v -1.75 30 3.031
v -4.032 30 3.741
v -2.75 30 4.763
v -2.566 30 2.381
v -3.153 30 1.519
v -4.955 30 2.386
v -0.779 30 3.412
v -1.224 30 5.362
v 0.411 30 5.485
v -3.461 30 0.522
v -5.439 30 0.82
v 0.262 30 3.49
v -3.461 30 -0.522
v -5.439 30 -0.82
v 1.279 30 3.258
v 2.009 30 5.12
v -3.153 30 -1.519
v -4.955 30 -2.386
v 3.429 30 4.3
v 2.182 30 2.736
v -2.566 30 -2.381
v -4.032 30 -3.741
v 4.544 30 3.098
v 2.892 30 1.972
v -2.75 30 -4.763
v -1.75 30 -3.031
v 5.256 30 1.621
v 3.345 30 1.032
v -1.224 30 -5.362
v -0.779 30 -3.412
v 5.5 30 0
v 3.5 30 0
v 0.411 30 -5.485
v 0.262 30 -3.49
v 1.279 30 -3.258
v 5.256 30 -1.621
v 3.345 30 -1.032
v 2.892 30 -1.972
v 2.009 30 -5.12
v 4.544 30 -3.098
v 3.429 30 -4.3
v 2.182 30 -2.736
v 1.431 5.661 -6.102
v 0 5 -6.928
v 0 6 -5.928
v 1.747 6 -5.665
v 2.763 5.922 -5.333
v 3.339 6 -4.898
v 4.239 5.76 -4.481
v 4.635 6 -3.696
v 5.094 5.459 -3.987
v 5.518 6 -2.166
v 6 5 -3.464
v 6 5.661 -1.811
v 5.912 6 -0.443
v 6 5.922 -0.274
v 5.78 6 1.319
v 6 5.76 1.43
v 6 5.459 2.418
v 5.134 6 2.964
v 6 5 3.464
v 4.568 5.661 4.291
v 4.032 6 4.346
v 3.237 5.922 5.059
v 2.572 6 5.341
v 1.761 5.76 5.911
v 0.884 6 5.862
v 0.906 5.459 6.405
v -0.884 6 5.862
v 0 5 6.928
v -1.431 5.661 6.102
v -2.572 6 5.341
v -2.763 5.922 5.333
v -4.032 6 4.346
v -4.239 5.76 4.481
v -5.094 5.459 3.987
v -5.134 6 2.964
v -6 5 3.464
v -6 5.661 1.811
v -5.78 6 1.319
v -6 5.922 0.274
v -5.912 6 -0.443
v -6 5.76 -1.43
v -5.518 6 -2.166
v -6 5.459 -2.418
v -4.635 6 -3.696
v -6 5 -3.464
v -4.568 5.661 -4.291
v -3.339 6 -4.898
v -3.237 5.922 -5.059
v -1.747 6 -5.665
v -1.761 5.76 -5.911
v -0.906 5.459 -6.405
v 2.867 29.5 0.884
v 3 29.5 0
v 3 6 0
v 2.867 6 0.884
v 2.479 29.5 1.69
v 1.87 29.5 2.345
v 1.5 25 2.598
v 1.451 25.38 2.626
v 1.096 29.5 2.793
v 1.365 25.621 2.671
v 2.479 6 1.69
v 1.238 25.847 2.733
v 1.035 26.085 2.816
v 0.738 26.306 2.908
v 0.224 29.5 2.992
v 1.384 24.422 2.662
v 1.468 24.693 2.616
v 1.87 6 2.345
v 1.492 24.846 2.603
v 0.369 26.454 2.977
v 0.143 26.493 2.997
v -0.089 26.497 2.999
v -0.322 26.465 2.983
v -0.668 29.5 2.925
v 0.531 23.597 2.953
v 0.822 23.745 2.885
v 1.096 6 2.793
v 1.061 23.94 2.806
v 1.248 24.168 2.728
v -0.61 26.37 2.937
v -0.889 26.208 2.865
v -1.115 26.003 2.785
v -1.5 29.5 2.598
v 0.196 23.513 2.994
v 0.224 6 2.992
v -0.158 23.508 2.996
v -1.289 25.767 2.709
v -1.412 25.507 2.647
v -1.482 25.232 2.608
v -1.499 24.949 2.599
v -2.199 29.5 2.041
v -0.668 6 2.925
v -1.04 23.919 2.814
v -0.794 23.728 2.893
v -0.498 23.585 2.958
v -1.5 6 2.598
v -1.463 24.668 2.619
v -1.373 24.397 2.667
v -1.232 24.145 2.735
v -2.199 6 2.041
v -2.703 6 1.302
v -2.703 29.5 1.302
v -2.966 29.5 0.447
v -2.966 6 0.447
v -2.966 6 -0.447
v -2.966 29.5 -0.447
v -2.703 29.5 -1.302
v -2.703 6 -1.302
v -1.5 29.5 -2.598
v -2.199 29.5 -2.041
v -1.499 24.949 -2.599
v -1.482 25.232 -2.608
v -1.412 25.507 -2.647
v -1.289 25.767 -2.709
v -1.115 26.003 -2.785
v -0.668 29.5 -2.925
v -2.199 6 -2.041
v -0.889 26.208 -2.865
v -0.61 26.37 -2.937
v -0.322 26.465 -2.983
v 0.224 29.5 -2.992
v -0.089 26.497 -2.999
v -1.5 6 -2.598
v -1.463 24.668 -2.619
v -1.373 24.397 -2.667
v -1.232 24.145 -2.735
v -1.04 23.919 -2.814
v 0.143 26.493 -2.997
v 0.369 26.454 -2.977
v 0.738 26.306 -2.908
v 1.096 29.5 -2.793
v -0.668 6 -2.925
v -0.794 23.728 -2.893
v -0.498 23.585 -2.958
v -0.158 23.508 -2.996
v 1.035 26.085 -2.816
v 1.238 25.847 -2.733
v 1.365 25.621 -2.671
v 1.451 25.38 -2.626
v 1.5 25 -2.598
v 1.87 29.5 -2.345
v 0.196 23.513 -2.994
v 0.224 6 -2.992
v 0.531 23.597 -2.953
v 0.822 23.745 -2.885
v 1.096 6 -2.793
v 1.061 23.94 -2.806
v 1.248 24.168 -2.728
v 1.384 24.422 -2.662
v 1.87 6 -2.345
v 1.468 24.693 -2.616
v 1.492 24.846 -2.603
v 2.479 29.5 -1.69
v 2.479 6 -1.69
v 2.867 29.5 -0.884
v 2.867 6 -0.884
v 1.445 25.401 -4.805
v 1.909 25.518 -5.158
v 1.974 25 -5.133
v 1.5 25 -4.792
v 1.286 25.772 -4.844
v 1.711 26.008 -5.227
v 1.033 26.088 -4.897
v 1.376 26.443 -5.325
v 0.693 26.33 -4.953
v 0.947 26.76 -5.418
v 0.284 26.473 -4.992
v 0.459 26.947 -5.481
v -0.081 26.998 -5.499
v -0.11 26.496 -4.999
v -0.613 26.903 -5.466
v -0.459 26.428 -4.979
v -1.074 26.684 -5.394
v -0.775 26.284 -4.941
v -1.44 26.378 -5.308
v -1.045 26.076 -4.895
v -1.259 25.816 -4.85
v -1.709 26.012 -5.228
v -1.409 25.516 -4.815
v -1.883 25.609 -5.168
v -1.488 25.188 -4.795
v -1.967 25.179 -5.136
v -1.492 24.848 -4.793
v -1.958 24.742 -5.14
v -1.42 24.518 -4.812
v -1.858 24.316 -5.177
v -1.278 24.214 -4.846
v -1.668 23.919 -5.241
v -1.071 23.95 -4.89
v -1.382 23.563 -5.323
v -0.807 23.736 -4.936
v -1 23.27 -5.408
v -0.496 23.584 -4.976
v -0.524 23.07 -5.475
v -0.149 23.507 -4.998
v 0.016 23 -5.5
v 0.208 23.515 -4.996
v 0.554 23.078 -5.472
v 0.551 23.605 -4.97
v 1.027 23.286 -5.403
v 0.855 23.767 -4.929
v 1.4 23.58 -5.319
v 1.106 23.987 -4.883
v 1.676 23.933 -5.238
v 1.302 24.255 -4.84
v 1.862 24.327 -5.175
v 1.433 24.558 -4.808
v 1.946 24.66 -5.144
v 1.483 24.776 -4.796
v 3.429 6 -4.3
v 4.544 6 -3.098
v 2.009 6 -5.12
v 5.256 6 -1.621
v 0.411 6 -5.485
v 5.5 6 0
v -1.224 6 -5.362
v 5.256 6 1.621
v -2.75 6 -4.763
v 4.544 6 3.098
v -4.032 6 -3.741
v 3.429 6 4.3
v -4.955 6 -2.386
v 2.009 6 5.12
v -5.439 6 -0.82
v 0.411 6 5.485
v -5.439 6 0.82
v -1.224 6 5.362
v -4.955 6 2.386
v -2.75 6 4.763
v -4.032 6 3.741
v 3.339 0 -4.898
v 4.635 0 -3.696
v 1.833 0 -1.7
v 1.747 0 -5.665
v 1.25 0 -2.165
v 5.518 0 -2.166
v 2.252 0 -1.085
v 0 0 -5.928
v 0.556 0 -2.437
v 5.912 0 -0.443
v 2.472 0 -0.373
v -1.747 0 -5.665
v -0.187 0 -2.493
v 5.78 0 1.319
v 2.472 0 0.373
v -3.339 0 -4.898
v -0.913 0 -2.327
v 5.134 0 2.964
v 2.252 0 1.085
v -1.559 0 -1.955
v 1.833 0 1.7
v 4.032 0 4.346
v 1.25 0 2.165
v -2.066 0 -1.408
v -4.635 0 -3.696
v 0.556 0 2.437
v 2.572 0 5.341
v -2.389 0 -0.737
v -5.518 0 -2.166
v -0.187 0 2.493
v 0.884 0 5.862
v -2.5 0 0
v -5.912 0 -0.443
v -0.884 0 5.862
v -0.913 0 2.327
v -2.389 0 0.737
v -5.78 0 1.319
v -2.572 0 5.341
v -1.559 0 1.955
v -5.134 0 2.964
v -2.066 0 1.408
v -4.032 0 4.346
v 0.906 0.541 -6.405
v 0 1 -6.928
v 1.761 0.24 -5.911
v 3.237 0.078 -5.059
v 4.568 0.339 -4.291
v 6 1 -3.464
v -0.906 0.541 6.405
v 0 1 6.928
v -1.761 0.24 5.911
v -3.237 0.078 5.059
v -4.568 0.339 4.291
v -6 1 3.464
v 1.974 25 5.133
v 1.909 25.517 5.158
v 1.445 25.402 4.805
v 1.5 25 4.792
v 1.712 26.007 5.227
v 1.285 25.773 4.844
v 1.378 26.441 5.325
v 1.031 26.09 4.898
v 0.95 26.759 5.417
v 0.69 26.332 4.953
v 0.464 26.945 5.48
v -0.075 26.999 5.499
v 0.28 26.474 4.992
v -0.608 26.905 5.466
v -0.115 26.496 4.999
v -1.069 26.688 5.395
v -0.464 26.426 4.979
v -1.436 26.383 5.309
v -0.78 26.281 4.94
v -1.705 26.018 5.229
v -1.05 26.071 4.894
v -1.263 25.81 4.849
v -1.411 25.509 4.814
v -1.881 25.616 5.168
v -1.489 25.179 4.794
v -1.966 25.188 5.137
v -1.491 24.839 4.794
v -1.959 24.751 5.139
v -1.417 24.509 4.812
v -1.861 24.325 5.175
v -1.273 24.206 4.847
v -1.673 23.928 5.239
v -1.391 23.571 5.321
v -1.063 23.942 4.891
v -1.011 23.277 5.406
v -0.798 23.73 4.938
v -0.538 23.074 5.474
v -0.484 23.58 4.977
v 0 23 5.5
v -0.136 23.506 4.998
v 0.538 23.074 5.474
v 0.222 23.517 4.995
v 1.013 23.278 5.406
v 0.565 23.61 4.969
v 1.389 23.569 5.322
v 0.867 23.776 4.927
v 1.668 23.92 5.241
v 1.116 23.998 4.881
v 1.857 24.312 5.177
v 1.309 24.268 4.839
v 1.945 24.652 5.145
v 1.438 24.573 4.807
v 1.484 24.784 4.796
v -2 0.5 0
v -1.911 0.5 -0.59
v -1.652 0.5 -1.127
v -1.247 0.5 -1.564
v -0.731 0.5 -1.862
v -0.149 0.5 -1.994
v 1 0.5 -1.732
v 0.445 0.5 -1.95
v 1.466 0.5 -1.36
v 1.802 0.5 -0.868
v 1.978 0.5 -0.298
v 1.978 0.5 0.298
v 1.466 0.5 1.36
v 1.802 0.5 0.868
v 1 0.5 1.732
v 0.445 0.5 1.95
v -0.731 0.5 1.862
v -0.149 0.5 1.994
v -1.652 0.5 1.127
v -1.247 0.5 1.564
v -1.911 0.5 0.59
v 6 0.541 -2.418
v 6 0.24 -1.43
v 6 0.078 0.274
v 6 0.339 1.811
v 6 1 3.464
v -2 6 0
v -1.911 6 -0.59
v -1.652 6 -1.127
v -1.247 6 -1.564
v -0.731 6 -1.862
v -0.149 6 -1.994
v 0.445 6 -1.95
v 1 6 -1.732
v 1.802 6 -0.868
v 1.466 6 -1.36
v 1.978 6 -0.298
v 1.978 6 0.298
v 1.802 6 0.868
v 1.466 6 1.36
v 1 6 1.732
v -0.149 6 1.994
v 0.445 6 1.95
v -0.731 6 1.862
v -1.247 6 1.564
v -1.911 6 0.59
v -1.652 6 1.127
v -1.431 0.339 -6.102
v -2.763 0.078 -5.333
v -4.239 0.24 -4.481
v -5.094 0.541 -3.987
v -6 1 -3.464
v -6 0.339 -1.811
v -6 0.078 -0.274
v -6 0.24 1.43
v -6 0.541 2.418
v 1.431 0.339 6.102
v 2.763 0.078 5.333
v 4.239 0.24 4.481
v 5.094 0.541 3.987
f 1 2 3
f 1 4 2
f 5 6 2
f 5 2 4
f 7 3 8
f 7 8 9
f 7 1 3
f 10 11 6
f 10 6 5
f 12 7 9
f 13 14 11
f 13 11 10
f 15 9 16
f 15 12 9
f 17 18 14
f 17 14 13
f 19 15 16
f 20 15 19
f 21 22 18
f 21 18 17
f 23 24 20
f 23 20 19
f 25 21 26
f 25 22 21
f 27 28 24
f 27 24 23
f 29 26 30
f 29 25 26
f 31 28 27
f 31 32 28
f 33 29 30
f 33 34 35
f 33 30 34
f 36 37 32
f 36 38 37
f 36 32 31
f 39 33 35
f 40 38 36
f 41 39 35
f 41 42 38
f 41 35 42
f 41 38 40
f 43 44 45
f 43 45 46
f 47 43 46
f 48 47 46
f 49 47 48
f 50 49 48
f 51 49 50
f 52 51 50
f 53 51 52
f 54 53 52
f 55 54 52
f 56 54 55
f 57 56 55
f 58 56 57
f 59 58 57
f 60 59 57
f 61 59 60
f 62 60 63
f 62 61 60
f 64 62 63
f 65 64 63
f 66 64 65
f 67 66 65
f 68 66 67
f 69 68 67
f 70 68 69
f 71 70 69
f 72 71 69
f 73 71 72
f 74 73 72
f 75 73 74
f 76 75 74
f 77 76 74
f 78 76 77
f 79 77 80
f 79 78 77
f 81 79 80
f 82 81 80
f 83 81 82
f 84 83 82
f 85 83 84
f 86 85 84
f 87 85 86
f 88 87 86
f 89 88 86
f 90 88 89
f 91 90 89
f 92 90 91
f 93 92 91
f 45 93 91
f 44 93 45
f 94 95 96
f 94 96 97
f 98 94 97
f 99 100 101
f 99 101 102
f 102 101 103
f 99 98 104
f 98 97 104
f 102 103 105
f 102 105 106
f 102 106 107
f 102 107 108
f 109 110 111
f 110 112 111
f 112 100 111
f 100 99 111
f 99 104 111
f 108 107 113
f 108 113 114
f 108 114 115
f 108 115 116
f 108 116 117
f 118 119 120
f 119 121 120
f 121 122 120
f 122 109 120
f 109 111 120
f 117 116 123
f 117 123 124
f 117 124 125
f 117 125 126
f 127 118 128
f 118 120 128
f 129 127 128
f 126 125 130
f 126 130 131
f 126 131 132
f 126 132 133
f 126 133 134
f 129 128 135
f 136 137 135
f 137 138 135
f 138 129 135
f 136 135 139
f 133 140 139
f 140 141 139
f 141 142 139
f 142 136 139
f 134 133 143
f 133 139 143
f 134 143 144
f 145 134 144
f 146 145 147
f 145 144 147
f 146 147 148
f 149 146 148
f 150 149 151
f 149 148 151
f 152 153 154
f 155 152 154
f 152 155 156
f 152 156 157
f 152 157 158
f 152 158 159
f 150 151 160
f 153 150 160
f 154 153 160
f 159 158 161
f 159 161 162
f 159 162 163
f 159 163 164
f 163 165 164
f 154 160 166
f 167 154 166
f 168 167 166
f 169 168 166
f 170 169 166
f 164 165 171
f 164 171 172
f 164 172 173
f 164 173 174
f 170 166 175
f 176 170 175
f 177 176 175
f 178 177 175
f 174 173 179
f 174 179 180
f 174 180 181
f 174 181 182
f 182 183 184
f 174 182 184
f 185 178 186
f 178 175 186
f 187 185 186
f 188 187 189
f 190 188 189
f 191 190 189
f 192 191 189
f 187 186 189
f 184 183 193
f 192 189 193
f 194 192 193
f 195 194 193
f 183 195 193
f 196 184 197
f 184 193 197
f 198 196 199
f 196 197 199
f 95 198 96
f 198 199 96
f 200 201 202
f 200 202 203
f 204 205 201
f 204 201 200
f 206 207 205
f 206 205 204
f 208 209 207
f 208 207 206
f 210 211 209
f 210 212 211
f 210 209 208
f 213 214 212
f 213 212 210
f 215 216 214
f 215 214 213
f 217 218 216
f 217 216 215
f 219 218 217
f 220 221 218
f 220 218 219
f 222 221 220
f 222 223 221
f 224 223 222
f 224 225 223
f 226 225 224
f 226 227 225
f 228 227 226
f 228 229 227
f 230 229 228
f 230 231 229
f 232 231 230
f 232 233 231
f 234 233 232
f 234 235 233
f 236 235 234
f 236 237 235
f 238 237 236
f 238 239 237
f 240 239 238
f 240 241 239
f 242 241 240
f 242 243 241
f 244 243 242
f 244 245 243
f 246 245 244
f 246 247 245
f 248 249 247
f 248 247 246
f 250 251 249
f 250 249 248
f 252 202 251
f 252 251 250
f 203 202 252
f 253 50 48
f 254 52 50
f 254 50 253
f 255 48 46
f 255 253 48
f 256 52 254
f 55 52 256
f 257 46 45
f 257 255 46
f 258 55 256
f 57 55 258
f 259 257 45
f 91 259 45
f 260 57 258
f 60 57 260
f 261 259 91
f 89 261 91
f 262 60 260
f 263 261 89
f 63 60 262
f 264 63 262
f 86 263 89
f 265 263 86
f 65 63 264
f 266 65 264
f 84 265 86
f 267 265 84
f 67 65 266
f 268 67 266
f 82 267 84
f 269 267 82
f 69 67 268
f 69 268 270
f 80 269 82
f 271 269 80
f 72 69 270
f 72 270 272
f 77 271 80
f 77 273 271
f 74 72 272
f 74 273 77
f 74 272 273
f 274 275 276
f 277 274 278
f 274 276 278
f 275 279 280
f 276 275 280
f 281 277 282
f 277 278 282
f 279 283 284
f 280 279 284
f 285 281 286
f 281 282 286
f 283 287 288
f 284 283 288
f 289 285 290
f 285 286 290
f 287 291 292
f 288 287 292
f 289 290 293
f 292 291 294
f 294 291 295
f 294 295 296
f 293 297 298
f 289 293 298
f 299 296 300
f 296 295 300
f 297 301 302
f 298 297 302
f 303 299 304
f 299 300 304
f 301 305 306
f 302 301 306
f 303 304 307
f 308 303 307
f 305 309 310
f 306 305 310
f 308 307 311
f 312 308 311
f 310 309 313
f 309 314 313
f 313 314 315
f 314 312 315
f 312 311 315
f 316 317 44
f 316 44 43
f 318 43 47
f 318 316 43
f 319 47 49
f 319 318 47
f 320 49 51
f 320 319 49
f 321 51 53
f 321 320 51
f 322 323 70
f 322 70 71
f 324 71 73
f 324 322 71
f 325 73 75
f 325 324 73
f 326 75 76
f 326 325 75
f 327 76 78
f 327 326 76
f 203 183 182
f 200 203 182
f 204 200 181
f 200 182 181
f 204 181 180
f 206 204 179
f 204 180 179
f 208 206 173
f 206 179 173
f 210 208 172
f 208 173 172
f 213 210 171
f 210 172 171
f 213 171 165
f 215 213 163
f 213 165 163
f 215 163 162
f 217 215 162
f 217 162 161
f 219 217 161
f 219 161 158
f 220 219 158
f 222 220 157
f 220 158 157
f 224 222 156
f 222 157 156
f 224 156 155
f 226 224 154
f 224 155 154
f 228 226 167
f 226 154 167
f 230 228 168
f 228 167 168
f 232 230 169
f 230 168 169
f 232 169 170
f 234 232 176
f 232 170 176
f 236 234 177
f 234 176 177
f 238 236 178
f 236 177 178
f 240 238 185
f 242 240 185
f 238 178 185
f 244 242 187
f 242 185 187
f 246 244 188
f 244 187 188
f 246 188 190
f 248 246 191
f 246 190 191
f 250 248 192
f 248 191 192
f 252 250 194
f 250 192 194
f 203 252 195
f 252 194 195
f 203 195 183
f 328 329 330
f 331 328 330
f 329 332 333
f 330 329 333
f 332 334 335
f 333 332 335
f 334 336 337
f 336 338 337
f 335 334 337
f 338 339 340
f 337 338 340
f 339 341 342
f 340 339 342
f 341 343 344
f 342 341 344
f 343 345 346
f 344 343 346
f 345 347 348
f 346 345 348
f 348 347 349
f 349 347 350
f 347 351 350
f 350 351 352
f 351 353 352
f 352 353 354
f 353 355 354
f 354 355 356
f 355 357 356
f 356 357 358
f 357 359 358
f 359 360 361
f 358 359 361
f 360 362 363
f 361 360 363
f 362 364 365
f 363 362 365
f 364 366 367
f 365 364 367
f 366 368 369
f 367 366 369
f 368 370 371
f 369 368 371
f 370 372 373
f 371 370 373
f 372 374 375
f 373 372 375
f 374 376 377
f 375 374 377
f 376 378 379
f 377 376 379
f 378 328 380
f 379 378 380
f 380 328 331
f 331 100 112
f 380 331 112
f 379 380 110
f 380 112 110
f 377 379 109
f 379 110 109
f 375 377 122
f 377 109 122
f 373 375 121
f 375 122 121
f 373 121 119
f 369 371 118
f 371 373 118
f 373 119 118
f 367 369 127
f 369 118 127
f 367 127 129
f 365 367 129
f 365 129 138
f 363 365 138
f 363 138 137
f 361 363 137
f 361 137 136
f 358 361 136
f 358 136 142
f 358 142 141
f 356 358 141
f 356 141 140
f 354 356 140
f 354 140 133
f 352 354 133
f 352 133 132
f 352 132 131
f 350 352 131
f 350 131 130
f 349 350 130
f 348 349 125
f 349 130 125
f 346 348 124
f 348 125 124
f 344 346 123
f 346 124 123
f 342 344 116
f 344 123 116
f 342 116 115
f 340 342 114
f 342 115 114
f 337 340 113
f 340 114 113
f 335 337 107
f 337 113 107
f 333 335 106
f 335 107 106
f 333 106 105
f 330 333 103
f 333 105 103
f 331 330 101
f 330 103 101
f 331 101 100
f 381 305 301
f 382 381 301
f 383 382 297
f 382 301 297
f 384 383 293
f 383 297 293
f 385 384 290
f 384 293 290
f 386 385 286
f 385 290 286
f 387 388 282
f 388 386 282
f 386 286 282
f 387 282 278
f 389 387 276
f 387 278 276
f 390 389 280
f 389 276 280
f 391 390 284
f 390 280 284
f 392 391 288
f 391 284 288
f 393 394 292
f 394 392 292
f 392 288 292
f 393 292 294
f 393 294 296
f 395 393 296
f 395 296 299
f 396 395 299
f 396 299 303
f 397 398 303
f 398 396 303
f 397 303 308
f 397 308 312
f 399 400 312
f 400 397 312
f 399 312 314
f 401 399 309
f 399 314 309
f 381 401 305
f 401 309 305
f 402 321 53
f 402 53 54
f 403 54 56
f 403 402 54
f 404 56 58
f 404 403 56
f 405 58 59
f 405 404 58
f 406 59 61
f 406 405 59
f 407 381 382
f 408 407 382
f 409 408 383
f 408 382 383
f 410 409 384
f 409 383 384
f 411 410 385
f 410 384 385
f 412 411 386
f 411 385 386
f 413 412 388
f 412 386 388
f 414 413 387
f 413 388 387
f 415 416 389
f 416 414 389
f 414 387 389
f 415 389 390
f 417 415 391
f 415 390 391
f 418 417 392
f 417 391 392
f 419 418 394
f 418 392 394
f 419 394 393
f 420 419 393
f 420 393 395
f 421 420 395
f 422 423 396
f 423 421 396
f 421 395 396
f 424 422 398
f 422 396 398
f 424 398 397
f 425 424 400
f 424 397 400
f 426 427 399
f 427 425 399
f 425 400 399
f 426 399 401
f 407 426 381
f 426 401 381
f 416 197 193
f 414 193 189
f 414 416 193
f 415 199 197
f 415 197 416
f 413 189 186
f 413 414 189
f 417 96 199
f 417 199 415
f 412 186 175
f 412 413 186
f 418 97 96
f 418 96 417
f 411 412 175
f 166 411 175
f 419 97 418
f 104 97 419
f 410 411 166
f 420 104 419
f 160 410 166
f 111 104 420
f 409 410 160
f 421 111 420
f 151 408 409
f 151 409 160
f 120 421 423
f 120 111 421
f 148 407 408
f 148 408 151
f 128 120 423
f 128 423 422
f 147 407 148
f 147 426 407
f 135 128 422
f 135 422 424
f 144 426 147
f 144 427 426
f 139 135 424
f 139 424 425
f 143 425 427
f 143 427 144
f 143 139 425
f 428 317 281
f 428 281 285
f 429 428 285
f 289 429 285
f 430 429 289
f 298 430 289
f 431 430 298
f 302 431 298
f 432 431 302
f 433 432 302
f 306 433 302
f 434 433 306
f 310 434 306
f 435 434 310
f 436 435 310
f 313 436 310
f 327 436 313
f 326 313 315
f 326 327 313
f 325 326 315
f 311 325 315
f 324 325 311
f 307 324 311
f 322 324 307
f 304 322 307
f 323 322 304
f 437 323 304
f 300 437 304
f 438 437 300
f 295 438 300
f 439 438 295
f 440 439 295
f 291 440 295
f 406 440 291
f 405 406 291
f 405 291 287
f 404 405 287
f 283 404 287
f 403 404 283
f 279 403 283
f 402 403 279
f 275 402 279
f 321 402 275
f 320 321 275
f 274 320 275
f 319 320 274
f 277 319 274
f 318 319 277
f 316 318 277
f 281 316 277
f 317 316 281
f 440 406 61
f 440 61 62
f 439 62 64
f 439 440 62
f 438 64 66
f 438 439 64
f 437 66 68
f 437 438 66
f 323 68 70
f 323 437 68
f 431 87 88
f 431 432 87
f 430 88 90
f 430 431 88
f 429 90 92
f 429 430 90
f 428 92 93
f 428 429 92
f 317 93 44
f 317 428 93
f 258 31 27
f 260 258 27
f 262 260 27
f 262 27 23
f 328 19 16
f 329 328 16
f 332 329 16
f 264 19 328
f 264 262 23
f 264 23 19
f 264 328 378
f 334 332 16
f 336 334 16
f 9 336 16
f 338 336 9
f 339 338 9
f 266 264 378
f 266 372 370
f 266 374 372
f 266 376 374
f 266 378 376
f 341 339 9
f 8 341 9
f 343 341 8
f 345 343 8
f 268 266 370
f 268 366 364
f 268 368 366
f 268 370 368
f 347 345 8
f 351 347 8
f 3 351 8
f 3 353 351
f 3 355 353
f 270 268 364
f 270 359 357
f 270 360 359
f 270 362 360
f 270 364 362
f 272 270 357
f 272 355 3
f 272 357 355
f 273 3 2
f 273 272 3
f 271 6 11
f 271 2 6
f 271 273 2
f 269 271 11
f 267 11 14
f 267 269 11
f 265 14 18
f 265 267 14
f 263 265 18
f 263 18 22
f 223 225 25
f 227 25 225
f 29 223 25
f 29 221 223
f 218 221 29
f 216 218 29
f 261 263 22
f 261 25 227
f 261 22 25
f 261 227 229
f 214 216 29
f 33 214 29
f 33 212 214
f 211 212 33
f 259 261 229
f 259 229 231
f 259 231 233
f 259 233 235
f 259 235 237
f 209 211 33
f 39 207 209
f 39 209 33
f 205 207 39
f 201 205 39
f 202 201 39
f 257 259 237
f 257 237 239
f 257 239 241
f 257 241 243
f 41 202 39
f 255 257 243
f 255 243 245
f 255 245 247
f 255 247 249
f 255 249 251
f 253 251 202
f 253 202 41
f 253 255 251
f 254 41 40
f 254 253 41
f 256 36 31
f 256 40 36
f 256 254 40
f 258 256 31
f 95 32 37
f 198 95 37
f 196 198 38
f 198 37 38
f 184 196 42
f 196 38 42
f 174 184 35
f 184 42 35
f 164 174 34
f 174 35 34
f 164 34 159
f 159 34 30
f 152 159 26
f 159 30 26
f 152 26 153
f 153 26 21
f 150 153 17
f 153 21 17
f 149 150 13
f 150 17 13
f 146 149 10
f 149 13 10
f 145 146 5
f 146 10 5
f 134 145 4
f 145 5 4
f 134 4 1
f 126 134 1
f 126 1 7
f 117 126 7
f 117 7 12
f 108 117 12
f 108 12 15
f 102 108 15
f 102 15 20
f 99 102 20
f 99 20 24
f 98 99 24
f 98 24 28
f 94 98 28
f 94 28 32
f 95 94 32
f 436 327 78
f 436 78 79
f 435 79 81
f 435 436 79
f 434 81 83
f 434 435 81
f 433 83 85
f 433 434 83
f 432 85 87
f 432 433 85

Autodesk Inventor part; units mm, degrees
ref_plane "YZ Plane" through (0, 0, 0) normal (1, 0, 0) x (0, 1, 0)
ref_plane "XZ Plane" through (0, 0, 0) normal (0, 1, 0) x (-1, 0, 0)
ref_plane "XY Plane" through (0, 0, 0) normal (0, 0, 1) x (1, 0, 0)
sketch "Sketch1" plane through (0, 0, 0) normal (0, 1, 0) x (-1, 0, 0)
  line L0 (6, -3.4641) -> (0, -6.9282)
  line L1 (0, -6.9282) -> (-6, -3.4641)
  line L2 (-6, -3.4641) -> (-6, 3.4641)
  line L3 (-6, 3.4641) -> (0, 6.9282)
  line L4 (0, 6.9282) -> (6, 3.4641)
  line L5 (6, 3.4641) -> (6, -3.4641)
  circle A0 centre (0, 0) radius 2
  dimension "d0" = 6
  dimension "d1" = 4
extrude "Extrusion1" add sketch "Sketch1" along normal blind 6
sketch "Sketch2" plane through (0, 6, 0) normal (0, 1, 0) x (1, 0, 0)
  circle A0 centre (0, 0) radius 3
  circle A1 centre (0, 0) radius 5.5
  dimension "d4" = 6
  dimension "d5" = 11
extrude "Extrusion2" add sketch "Sketch2" along normal blind 24
sketch "Sketch3" plane through (0, 0, 0) normal (0, 0, 1) x (1, 0, 0)
  circle A0 centre (0, 25) radius 1.5
  line L0 (-5.3, 30) -> (5.3, 30) projected
  point P0 (0, 0)
  dimension "d16" = 3
extrude "Extrusion3" cut sketch "Sketch3" along normal mid plane 24
chamfer "Chamfer" distance 0.5 angle 45 4 edges at (2, 0, 0) (-3, 30, 0) (-1.5, 25.0054, -5.2915) (-1.5, 25.0054, 5.2915)
sketch "Sketch4" plane through (0, 0, 0) normal (1, 0, 0) x (0, 1, 0)
  line L0 (0, -3.4641) -> (0, -6.9282) projected
  line L1 (0, -6.9282) -> (0, -5.9282)
  line L2 (0, -6.9282) -> (1, -6.9282)
  line L3 (1, -6.9282) -> (0, -5.9282)
  line L4 (-6, 0) -> (36, 0) projected
  line L5 (0, -6.9282) -> (6, -6.9282) projected
  line L6 (6, -6.9282) -> (5, -6.9282)
  line L7 (6, -6.9282) -> (6, -5.9282)
  line L8 (6, -5.9282) -> (5, -6.9282)
  dimension "d31" = 1
  dimension "d32" = 1
  dimension "d36" = 1
  dimension "d37" = 1
revolve "Revolution" cut sketch "Sketch4" angle 360 about axis through (0, -10, 0) along (0, 1, 0)
thread "Thread1" size "M3x0.5" class "6H" standard "ANSI Metric M Profile" full length
thread "Thread2" size "M3x0.5" class "6H" standard "ANSI Metric M Profile" full length
thread "Thread3" size "M4x0.7" class "6H" standard "ANSI Metric M Profile" full length
properties part number "6mmID_30mmL_hex_adapter"
